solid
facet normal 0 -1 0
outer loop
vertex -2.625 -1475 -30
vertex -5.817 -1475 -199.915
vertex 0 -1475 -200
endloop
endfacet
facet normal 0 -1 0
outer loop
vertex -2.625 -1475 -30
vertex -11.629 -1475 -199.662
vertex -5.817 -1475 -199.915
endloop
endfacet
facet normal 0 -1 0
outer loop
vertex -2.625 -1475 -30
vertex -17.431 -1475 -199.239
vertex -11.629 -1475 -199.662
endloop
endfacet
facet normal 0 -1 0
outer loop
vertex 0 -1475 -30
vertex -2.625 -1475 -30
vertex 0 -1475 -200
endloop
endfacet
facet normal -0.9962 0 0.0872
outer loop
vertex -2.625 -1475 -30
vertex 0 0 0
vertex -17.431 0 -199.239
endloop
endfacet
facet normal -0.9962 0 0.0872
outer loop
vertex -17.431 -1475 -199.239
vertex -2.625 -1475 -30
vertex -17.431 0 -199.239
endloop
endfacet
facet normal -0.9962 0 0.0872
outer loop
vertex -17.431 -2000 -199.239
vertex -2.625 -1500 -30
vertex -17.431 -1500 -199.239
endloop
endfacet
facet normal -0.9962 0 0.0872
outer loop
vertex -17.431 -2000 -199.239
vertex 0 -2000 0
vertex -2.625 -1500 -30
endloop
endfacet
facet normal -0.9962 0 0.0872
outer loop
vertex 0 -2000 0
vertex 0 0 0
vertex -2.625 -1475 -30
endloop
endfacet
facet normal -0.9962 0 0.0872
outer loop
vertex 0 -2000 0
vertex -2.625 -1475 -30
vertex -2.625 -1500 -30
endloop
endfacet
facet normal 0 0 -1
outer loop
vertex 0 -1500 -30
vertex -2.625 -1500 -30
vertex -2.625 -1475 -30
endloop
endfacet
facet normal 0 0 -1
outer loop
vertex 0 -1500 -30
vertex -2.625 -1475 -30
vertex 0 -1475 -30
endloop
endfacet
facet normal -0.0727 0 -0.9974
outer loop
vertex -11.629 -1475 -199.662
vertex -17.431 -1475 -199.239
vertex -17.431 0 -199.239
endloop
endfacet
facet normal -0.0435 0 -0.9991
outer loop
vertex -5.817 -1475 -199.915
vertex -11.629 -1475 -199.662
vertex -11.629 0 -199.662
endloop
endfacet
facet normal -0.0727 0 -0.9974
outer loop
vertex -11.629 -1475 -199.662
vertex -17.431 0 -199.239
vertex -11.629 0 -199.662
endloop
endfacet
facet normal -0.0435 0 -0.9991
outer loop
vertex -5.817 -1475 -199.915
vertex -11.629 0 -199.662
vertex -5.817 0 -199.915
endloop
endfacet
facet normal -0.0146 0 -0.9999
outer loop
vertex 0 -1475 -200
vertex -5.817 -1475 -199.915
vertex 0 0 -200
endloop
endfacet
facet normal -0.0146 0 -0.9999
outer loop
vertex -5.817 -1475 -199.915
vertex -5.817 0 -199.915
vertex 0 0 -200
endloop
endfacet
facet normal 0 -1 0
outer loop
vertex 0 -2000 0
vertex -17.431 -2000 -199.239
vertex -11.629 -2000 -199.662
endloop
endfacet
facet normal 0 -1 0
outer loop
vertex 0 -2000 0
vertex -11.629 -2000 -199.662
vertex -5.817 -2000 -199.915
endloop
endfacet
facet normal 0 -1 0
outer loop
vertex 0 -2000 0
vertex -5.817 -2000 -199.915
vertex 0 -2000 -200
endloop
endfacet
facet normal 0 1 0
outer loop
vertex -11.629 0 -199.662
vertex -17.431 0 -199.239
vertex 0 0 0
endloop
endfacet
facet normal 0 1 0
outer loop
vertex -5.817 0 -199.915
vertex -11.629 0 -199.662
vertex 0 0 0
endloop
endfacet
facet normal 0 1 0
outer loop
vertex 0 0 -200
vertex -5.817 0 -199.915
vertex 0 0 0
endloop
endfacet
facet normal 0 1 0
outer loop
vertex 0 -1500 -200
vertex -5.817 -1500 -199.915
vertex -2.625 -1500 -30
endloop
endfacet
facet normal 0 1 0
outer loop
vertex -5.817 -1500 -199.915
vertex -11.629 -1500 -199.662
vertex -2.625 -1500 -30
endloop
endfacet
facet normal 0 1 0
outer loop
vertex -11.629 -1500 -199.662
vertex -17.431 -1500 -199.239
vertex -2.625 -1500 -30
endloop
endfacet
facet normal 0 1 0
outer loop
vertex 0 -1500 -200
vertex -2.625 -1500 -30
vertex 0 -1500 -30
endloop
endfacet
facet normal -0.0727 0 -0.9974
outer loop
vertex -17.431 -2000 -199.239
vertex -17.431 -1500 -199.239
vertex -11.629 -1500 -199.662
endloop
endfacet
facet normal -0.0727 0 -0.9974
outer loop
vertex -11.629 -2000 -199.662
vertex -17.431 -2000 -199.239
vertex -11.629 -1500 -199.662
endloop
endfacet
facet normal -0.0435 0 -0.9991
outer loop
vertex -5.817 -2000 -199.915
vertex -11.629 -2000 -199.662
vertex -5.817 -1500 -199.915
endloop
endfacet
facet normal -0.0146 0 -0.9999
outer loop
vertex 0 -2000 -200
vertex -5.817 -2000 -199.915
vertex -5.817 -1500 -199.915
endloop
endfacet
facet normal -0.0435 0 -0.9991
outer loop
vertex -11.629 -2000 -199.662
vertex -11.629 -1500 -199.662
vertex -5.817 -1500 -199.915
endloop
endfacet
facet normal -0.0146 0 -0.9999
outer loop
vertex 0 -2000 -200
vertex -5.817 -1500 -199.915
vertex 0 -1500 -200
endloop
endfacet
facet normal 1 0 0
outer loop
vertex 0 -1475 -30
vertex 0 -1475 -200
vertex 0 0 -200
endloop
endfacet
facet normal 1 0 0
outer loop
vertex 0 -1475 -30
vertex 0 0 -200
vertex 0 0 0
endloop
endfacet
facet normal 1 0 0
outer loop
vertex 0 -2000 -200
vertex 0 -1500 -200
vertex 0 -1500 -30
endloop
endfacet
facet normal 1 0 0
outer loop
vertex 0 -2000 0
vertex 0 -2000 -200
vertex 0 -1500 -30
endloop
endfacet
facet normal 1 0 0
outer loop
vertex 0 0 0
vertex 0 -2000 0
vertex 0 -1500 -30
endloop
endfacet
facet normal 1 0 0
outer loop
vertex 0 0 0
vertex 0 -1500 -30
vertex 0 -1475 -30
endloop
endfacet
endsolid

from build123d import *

# Parameters (mm, degrees)
F0_R     = 200
F1_DEPTH = 2000
F3_R     = 377.245837
F3_W     = 300
F3_H     = 60
F4_DEPTH = 25
F6_DEPTH = 2000


with BuildPart() as f1:
    # F0 (on Front) → F1 (new body)
    with BuildSketch(Plane.XZ):
        Circle(F0_R)
    extrude(amount=F1_DEPTH)

    # F3 (on offset) → F4 (cut)
    with BuildSketch(Plane.XZ.offset(1500)):
        Circle(F3_R)
        Rectangle(F3_W, F3_H, mode=Mode.SUBTRACT)
    extrude(amount=-F4_DEPTH, mode=Mode.SUBTRACT)

    # F5 (on face) → F6 (intersect)
    with BuildSketch(Plane.XZ.offset(2000)):
        with BuildLine():
            Line((0, -200), (0, 0))
            Line((0, 0), (-17.431149, -199.23894))
            ThreePointArc((-17.431149, -199.23894), (-8.723877, -199.809644), (0, -200))
        make_face()
    extrude(amount=-F6_DEPTH, mode=Mode.INTERSECT)


solid = f1.part
